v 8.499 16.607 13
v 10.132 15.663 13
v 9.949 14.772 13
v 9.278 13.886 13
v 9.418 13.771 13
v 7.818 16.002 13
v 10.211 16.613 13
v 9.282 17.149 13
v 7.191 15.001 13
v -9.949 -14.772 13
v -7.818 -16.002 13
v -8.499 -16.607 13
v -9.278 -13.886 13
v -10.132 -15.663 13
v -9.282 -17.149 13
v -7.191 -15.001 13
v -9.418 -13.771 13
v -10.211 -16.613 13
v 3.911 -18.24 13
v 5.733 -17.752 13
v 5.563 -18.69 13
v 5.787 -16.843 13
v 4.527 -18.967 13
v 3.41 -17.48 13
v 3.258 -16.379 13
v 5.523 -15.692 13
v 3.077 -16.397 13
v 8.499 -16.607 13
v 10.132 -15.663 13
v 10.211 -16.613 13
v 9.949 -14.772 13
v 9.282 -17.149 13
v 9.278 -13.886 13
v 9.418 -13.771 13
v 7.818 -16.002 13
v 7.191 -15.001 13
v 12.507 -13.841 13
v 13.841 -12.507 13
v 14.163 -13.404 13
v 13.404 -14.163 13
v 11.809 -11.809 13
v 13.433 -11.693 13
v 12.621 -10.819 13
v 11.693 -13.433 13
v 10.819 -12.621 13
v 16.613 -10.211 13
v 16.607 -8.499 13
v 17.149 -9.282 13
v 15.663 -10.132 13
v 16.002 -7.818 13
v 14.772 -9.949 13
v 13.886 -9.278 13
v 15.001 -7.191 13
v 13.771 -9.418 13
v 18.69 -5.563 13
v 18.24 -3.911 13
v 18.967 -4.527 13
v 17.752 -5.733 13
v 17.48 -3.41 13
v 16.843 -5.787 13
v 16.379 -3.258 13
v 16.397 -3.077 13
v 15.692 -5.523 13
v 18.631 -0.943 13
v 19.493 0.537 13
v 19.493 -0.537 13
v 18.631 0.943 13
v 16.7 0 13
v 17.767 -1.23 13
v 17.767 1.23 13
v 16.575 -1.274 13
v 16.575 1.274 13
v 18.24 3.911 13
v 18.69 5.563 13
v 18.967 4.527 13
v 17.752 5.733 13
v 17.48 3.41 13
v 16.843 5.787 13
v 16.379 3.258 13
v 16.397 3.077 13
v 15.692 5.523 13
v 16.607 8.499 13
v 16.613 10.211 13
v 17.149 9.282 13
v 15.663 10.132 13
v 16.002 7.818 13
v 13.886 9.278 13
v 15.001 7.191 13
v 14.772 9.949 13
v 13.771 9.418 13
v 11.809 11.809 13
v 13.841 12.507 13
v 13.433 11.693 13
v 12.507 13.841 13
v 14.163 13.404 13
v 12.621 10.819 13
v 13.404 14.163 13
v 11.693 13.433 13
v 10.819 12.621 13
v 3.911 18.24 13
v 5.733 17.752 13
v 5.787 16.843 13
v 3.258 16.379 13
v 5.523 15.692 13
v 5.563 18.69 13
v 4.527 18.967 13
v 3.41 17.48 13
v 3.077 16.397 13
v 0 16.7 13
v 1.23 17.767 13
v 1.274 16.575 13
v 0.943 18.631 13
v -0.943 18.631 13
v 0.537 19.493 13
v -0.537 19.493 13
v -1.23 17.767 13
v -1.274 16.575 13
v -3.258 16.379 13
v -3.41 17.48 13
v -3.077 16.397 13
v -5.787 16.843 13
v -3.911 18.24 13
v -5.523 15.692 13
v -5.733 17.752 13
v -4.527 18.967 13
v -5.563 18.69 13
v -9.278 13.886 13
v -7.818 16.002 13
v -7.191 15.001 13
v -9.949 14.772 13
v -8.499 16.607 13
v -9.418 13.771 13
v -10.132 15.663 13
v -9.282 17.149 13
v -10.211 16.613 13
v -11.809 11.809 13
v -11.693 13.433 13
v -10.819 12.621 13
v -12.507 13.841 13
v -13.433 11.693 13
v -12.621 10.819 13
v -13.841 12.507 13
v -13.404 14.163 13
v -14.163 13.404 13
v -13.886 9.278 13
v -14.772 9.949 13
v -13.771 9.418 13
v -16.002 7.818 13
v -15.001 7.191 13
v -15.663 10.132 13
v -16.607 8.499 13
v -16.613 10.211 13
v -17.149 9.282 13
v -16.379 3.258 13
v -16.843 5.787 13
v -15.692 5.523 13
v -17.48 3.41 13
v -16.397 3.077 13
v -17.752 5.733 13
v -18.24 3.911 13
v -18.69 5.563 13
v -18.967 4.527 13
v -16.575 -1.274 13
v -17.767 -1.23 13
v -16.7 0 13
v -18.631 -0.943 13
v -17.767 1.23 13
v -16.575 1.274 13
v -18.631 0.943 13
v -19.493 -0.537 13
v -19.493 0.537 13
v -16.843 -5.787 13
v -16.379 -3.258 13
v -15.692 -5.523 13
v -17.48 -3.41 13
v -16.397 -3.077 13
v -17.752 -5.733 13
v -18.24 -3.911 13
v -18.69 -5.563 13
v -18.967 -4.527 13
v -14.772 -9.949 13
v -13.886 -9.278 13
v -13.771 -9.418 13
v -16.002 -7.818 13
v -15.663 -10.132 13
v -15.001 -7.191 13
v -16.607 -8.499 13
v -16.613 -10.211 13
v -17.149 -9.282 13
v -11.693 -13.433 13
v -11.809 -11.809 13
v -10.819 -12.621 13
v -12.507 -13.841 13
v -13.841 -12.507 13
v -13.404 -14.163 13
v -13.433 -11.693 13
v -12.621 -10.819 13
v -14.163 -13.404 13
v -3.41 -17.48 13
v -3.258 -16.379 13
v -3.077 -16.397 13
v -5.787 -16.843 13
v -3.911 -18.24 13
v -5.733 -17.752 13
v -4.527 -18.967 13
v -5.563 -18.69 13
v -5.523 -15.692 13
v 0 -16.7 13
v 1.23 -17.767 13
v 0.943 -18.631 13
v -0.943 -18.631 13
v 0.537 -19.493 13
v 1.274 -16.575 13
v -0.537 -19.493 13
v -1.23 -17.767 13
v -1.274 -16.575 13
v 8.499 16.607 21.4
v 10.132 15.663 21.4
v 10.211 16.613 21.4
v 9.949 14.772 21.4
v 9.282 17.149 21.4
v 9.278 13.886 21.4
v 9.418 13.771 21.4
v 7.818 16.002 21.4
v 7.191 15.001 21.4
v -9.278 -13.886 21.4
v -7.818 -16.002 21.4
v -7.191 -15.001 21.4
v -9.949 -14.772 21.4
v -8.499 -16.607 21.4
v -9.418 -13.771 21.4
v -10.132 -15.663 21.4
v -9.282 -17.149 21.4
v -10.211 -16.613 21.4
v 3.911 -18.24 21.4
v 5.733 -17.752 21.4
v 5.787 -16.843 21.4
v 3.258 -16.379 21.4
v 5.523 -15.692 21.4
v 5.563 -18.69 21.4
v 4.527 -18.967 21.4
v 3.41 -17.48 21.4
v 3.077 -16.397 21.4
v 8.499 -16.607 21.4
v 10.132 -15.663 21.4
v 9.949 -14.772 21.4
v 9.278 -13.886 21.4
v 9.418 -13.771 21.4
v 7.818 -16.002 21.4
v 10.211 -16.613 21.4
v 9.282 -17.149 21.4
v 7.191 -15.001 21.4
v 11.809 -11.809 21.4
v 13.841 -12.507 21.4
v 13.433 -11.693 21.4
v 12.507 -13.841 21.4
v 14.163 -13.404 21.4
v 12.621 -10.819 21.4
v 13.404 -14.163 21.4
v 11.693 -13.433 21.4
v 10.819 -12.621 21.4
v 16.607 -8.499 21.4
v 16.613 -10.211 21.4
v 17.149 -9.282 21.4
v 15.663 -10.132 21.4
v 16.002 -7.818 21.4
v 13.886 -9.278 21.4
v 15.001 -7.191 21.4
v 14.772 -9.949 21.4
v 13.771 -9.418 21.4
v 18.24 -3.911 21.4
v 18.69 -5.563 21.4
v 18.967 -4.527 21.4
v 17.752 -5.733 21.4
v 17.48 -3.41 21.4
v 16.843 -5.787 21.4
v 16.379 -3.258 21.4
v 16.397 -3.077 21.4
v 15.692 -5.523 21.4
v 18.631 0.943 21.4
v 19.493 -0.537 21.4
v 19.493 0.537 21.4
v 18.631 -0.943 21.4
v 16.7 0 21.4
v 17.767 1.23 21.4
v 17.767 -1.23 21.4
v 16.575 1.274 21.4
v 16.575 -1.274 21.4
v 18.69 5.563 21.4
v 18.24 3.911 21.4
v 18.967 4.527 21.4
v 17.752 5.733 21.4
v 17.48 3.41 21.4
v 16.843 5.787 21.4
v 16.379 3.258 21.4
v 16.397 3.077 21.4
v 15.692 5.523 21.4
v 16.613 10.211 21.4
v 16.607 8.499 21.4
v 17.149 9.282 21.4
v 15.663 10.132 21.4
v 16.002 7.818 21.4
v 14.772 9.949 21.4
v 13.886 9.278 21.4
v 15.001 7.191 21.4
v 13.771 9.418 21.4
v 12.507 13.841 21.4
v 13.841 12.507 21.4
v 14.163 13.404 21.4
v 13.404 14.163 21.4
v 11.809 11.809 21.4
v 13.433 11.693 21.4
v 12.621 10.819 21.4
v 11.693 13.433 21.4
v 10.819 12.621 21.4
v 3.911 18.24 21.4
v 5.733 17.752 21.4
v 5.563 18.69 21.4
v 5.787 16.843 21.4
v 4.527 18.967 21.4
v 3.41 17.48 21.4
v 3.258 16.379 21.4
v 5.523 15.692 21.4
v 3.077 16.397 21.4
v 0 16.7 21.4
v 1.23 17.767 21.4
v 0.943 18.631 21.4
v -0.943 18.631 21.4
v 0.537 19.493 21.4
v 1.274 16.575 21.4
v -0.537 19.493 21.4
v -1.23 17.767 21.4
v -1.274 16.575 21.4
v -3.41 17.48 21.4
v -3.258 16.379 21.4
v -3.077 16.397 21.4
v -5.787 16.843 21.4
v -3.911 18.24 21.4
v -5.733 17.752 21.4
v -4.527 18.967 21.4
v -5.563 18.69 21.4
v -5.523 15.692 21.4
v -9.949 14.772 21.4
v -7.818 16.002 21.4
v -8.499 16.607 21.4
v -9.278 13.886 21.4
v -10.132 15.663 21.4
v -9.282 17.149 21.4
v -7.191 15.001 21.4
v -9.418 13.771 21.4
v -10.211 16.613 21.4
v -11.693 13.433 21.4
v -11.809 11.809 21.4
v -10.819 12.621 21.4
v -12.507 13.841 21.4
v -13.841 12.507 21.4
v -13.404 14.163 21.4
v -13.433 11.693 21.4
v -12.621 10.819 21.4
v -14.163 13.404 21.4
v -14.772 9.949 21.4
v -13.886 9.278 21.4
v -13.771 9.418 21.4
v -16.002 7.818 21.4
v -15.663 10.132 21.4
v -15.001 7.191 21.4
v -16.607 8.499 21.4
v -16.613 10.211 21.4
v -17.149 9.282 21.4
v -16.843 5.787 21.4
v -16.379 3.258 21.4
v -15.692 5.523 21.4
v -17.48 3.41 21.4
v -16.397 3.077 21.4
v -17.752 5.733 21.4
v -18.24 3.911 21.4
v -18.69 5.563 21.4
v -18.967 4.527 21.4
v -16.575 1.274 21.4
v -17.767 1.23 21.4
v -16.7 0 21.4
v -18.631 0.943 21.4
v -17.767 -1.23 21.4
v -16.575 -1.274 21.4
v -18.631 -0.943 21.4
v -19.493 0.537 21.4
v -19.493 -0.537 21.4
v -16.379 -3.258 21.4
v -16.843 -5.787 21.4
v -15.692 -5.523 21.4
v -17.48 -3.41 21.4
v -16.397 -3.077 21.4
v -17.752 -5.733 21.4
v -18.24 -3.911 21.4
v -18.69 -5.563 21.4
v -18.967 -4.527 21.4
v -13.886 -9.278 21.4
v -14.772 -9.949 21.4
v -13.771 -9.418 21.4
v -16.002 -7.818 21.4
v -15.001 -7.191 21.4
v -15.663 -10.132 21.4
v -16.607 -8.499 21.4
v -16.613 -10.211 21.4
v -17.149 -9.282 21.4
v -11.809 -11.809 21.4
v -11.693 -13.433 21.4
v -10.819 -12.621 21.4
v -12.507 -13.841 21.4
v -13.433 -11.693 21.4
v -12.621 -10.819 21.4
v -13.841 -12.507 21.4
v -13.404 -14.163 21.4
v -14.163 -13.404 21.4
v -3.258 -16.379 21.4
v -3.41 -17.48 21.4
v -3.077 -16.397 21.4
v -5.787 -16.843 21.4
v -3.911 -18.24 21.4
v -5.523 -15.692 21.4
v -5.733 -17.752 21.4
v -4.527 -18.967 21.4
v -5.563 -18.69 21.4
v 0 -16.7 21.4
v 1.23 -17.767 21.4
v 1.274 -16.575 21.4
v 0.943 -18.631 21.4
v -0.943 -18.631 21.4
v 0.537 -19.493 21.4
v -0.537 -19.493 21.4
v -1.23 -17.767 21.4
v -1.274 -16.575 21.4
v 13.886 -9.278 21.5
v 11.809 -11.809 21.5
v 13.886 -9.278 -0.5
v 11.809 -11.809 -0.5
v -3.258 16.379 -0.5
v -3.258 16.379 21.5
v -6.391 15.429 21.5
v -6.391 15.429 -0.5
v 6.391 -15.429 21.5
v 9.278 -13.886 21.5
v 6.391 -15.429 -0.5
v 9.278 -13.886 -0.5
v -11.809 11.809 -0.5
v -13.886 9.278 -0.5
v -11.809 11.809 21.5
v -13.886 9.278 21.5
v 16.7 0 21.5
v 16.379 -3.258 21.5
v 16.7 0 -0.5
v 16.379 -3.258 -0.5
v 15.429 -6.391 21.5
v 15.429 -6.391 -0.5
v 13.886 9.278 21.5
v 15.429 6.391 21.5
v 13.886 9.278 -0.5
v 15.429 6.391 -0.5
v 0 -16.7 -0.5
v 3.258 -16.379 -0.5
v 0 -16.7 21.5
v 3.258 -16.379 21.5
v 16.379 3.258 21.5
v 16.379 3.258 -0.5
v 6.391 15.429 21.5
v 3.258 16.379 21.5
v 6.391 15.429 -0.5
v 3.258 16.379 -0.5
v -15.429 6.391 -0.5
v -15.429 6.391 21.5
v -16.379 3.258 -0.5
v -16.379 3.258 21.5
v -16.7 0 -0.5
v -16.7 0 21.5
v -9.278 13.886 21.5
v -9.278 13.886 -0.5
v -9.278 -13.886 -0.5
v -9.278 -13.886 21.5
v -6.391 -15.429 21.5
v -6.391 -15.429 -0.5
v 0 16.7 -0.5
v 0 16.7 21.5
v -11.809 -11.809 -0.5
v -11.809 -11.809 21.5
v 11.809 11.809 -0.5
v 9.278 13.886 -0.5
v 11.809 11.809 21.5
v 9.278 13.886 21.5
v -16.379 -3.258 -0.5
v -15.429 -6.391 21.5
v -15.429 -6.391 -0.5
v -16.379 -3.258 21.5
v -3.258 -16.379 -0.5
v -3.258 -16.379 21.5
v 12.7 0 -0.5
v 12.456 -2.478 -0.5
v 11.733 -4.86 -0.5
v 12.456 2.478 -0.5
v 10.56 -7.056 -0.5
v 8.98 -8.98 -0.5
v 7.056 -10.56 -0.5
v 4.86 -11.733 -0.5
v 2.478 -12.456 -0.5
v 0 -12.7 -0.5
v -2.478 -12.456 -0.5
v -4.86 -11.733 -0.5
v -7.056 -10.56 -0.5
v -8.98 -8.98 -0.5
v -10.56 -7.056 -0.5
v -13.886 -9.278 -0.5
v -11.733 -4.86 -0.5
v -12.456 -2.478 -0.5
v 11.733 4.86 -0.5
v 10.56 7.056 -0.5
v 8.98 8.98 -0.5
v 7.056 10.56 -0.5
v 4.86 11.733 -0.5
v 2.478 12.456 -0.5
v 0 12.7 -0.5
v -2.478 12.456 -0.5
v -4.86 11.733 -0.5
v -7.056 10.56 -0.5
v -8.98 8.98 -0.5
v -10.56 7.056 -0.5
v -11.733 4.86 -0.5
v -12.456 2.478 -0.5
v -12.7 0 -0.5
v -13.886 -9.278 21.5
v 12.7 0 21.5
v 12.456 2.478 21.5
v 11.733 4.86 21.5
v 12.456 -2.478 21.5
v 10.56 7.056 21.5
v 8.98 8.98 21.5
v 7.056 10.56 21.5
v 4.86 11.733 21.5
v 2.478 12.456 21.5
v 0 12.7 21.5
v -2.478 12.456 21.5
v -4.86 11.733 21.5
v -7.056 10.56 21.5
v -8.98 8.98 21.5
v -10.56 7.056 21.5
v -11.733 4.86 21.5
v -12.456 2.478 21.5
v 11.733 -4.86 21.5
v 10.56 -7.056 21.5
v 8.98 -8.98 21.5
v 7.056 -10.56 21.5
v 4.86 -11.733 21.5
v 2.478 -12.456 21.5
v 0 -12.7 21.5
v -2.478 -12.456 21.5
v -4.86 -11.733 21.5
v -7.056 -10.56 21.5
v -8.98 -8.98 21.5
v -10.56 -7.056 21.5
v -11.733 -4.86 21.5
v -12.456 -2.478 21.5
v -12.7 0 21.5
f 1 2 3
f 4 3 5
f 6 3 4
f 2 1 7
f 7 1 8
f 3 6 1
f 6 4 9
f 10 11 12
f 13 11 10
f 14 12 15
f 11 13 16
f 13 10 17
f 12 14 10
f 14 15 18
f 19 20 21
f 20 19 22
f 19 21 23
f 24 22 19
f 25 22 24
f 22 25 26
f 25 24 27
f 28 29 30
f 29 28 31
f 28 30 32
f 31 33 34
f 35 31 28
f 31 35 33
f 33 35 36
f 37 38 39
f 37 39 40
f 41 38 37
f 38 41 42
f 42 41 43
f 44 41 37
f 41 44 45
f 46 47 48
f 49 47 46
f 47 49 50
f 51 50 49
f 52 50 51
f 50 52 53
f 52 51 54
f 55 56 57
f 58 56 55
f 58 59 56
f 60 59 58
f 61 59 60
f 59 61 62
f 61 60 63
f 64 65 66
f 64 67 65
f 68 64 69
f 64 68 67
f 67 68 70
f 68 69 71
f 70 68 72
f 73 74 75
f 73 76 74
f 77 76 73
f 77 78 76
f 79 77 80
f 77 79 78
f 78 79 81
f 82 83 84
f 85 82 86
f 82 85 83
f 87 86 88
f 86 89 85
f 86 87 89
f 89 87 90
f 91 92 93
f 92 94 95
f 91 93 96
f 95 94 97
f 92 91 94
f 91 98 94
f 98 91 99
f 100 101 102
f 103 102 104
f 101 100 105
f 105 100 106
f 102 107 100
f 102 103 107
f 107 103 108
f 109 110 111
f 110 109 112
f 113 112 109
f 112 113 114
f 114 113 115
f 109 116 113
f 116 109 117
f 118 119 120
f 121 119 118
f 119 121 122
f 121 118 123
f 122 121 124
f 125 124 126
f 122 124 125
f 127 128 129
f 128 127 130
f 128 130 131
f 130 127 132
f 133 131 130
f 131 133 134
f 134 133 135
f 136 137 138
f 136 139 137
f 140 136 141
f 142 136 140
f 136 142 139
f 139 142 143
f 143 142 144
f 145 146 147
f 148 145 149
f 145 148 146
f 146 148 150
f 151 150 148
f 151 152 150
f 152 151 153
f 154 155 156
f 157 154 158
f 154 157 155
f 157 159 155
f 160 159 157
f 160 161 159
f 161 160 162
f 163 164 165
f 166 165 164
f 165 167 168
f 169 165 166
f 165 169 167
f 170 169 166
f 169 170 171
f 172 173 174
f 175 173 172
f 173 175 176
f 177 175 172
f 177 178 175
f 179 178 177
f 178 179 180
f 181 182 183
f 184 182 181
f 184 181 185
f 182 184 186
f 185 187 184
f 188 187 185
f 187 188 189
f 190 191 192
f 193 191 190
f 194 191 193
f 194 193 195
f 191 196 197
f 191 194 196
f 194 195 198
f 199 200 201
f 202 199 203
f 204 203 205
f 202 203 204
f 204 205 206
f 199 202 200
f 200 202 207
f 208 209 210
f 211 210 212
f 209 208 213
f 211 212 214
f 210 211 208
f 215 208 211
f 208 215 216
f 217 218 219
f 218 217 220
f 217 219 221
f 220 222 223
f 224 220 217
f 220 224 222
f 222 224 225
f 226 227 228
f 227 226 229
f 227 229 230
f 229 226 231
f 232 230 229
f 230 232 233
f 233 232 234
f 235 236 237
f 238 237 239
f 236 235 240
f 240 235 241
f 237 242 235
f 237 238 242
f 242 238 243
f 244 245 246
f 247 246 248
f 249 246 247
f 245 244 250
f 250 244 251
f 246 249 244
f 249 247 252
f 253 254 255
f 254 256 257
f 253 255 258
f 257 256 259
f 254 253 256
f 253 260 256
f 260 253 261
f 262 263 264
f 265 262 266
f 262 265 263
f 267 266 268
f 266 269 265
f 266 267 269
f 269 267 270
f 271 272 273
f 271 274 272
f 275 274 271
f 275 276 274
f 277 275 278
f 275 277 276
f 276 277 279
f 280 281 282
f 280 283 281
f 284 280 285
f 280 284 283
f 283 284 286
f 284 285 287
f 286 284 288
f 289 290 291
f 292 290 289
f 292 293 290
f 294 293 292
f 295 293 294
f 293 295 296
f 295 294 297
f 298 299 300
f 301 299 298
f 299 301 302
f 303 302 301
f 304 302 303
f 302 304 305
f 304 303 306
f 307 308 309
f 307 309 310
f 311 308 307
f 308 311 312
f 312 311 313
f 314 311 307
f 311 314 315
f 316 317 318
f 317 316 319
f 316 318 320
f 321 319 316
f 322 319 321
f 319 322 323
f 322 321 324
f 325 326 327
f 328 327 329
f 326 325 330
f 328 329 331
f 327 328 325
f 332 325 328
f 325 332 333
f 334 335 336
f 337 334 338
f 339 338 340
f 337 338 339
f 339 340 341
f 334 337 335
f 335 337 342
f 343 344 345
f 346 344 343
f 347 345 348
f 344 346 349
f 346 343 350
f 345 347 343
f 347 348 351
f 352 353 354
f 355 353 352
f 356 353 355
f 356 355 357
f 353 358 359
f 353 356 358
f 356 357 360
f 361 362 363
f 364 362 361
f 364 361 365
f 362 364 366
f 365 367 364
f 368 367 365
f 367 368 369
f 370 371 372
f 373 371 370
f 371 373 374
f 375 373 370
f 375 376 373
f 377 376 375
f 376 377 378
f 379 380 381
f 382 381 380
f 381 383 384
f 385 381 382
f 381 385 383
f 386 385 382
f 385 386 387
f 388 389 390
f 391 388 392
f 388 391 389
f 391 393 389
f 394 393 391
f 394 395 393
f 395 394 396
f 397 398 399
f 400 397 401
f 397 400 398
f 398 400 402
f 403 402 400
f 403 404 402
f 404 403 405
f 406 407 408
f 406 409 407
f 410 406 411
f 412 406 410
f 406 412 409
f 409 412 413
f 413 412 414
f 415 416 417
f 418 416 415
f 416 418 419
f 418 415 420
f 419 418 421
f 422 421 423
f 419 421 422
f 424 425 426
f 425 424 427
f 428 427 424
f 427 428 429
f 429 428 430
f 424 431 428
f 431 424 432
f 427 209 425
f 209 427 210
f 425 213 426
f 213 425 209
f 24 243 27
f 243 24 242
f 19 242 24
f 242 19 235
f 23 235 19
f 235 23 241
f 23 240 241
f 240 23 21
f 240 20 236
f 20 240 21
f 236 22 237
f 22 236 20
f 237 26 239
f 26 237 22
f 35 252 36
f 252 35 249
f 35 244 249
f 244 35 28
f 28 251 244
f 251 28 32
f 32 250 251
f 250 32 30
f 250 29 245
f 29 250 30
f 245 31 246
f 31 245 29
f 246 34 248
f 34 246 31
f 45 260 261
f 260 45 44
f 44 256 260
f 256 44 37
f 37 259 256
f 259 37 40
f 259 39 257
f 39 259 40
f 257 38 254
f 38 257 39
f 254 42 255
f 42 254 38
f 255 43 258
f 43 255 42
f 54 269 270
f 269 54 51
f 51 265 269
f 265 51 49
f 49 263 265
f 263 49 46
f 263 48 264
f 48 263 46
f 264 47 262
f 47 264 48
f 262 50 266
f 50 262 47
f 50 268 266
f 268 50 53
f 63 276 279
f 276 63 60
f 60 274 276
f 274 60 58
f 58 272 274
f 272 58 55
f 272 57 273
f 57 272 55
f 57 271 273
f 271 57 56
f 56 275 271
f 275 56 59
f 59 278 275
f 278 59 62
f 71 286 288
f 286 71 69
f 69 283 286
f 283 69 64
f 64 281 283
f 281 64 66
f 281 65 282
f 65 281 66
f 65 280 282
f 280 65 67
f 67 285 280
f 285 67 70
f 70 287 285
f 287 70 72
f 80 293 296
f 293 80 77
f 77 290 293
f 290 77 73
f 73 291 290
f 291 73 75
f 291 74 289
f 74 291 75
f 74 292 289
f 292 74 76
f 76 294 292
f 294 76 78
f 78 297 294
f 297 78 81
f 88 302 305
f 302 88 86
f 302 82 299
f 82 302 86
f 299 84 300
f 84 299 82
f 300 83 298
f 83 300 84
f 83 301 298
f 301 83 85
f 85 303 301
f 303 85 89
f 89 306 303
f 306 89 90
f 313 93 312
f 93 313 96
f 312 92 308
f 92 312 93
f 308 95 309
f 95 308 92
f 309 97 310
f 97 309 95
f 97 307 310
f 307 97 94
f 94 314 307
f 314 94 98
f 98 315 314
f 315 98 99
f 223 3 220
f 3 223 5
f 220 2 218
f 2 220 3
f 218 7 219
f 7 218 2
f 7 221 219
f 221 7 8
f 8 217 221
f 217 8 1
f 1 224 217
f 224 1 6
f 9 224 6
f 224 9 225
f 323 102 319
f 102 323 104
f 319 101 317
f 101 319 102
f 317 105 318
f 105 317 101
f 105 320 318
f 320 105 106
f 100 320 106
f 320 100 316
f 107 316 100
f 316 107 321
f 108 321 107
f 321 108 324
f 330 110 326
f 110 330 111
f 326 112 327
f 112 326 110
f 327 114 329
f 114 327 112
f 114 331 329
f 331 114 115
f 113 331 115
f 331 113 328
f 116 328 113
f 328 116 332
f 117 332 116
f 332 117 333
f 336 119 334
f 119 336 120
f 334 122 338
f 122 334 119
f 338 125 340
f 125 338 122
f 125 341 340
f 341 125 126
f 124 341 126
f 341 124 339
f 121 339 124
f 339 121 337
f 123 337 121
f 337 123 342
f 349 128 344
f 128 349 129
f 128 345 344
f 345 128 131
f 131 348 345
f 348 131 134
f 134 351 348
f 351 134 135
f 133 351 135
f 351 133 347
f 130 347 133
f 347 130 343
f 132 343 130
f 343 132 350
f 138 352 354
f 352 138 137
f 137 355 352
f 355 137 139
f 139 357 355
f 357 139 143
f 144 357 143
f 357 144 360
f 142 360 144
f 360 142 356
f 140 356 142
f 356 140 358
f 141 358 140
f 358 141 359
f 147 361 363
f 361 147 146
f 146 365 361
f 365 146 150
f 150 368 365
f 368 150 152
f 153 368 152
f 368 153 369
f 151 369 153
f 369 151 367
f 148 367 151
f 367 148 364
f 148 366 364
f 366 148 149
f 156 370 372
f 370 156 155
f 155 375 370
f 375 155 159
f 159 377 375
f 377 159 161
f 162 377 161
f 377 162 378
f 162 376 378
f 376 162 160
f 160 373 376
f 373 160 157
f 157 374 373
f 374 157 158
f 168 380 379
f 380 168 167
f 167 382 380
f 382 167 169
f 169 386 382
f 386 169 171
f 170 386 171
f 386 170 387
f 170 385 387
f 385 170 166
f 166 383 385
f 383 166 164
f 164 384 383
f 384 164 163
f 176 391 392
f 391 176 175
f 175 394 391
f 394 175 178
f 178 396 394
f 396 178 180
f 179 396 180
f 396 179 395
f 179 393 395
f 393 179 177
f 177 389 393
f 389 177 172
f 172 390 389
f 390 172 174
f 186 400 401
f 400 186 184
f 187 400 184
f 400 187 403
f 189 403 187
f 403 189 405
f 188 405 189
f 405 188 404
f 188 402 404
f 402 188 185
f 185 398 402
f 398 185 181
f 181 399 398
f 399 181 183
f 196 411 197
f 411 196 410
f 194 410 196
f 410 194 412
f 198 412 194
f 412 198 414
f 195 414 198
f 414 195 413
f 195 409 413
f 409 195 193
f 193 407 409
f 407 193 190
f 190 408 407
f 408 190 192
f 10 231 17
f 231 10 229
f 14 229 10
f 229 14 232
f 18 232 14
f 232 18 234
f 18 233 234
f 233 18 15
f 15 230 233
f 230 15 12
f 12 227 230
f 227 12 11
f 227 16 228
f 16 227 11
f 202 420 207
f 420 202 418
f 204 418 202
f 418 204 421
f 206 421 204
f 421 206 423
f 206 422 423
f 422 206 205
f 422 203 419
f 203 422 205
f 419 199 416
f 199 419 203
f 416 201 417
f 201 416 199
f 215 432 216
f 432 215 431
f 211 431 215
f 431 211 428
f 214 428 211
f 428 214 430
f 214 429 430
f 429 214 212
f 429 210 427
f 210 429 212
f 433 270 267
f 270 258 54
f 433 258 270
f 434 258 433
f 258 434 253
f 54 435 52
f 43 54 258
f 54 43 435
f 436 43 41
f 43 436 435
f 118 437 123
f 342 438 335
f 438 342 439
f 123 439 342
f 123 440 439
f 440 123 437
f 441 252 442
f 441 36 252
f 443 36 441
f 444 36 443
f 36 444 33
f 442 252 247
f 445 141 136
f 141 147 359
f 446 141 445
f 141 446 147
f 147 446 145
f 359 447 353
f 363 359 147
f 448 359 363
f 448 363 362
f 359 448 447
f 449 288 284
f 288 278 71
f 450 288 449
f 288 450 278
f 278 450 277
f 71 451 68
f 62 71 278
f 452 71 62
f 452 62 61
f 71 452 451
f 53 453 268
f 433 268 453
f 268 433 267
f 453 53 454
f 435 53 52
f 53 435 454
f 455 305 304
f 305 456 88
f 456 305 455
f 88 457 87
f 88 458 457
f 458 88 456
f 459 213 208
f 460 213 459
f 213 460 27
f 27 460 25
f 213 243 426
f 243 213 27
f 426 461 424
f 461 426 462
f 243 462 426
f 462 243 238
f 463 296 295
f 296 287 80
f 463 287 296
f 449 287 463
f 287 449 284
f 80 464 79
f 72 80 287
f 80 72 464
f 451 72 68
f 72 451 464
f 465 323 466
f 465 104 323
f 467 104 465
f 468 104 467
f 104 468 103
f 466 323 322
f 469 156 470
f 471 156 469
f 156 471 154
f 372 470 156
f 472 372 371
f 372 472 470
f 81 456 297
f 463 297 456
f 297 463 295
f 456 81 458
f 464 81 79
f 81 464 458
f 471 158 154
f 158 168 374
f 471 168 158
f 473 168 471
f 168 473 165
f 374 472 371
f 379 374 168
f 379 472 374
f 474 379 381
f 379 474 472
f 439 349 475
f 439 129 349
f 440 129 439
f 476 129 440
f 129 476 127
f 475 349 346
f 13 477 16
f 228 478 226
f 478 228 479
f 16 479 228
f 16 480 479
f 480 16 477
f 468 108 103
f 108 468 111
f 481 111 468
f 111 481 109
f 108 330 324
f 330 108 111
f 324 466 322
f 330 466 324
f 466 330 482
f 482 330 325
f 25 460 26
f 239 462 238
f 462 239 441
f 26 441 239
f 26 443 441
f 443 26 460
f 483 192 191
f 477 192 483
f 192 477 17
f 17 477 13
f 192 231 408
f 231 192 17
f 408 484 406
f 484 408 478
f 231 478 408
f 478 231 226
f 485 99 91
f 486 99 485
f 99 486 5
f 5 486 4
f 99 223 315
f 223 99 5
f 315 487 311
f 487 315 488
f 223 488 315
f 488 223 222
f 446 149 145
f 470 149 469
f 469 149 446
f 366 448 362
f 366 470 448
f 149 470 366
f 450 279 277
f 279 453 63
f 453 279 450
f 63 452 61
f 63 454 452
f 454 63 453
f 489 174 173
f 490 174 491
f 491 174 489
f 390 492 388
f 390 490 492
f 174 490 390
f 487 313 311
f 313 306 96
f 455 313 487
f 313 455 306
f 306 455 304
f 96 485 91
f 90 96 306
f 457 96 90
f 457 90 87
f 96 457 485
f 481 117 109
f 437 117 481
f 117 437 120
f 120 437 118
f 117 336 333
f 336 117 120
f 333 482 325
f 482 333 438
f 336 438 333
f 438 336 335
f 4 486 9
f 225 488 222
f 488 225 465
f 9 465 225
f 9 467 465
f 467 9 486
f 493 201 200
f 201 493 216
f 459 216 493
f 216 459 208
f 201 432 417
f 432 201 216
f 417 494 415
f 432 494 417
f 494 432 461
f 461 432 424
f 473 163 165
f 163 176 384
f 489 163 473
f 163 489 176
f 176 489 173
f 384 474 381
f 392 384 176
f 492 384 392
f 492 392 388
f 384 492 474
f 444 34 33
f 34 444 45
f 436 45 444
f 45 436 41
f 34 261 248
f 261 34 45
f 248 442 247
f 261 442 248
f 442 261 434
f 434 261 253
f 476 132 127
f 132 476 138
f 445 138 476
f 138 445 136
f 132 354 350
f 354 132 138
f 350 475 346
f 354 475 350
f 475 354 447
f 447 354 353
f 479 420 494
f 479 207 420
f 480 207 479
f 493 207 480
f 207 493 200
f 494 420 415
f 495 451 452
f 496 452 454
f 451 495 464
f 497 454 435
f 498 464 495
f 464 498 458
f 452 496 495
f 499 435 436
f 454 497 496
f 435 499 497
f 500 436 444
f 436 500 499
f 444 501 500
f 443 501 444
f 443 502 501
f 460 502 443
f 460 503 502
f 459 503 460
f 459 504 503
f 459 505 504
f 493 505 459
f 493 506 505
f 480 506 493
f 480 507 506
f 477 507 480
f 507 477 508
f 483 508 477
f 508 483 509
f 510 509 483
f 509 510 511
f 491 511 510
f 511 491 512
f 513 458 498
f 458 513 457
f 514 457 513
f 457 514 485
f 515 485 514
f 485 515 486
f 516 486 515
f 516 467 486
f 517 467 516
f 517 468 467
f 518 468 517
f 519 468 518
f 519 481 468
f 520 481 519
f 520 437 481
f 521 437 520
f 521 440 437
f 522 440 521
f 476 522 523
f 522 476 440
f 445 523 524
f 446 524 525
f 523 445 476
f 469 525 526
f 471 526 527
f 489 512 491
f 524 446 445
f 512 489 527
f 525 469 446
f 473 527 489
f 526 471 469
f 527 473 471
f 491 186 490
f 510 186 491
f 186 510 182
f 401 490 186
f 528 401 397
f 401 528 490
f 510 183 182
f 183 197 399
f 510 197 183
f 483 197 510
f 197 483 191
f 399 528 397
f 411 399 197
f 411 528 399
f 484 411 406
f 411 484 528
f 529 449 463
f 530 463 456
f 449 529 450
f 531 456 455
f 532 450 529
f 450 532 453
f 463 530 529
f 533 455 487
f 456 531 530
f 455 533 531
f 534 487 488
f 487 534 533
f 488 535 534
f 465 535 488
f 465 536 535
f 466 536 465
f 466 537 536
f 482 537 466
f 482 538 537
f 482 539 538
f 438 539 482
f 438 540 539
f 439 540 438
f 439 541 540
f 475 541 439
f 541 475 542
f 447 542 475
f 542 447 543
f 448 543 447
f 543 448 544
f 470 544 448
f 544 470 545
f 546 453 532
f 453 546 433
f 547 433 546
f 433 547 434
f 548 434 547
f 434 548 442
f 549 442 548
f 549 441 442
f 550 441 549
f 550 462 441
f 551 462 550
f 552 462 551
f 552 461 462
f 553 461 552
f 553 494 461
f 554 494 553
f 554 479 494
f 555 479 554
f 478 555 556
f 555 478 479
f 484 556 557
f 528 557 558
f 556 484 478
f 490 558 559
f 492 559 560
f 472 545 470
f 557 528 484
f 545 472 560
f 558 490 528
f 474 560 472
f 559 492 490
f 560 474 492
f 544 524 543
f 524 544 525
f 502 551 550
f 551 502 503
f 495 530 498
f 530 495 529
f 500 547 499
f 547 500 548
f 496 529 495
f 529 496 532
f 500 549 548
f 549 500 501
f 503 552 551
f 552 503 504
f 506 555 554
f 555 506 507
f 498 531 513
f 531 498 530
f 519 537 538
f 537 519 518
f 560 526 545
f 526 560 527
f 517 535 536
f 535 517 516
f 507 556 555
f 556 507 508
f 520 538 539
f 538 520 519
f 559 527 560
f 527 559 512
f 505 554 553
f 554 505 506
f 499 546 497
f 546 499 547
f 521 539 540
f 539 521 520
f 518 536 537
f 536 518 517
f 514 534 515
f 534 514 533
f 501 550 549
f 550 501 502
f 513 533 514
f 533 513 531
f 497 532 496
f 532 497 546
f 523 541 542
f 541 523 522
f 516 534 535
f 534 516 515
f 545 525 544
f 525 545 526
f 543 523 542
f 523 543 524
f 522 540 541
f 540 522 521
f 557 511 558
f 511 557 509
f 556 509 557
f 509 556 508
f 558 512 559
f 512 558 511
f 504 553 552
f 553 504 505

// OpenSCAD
$fn = 32;

// ----------------------------------------------------------------------
// Two-module gear rim: z12 m2 and z24 m1.5, 21 mm wide
// ----------------------------------------------------------------------

// --- parameters (mm) ---
module_a = 2;             // first tooth module
teeth_a = 12;             // first band tooth count
module_b = 1.5;           // second tooth module
teeth_b = 24;             // second band tooth count
band_h = 8;               // height of one tooth band
web_t = 5;                // web thickness between the bands
total = 21;               // overall width over both bands
root_r = 9.5;             // root radius of the coarse band
hub_r = 16.7;             // hub radius
bore_d = 25.4;            // hub bore
hole_count = 4;           // lightening holes
hole_r = 7.75;            // lightening hole circle radius
hole_d = 4;               // lightening hole diameter

band_a = [[9.4, -1.378], [12.124, -1.51], [13.058, -1.154], [13.986, -0.621], [13.986, 0.621], [13.058, 1.154], [12.124, 1.51], [9.4, 1.378], [8.829, 3.507], [11.254, 4.755], [11.885, 5.53], [12.423, 6.456], [11.802, 7.531], [10.732, 7.528], [9.745, 7.369], [7.451, 5.893], [5.893, 7.451], [7.369, 9.745], [7.528, 10.732], [7.531, 11.802], [6.456, 12.423], [5.53, 11.885], [4.755, 11.254], [3.507, 8.829], [1.378, 9.4], [1.51, 12.124], [1.154, 13.058], [0.621, 13.986], [-0.621, 13.986], [-1.154, 13.058], [-1.51, 12.124], [-1.378, 9.4], [-3.507, 8.829], [-4.755, 11.254], [-5.53, 11.885], [-6.456, 12.423], [-7.531, 11.802], [-7.528, 10.732], [-7.369, 9.745], [-5.893, 7.451], [-7.451, 5.893], [-9.745, 7.369], [-10.732, 7.528], [-11.802, 7.531], [-12.423, 6.456], [-11.885, 5.53], [-11.254, 4.755], [-8.829, 3.507], [-9.4, 1.378], [-12.124, 1.51], [-13.058, 1.154], [-13.986, 0.621], [-13.986, -0.621], [-13.058, -1.154], [-12.124, -1.51], [-9.4, -1.378], [-8.829, -3.507], [-11.254, -4.755], [-11.885, -5.53], [-12.423, -6.456], [-11.802, -7.531], [-10.732, -7.528], [-9.745, -7.369], [-7.451, -5.893], [-5.893, -7.451], [-7.369, -9.745], [-7.528, -10.732], [-7.531, -11.802], [-6.456, -12.423], [-5.53, -11.885], [-4.755, -11.254], [-3.507, -8.829], [-1.378, -9.4], [-1.51, -12.124], [-1.154, -13.058], [-0.621, -13.986], [0.621, -13.986], [1.154, -13.058], [1.51, -12.124], [1.378, -9.4], [3.507, -8.829], [4.755, -11.254], [5.53, -11.885], [6.456, -12.423], [7.531, -11.802], [7.528, -10.732], [7.369, -9.745], [5.893, -7.451], [7.451, -5.893], [9.745, -7.369], [10.732, -7.528], [11.802, -7.531], [12.423, -6.456], [11.885, -5.53], [11.254, -4.755], [8.829, -3.507]];
band_b = [[16.073, -1.292], [17.767, -1.23], [18.631, -0.943], [19.493, -0.537], [19.493, 0.537], [18.631, 0.943], [17.767, 1.23], [16.073, 1.292], [15.86, 2.912], [17.48, 3.41], [18.24, 3.911], [18.967, 4.527], [18.69, 5.563], [17.752, 5.733], [16.843, 5.787], [15.191, 5.408], [14.566, 6.918], [16.002, 7.818], [16.607, 8.499], [17.149, 9.282], [16.613, 10.211], [15.663, 10.132], [14.772, 9.949], [13.274, 9.155], [12.279, 10.452], [13.433, 11.693], [13.841, 12.507], [14.163, 13.404], [13.404, 14.163], [12.507, 13.841], [11.693, 13.433], [10.452, 12.279], [9.155, 13.274], [9.949, 14.772], [10.132, 15.663], [10.211, 16.613], [9.282, 17.149], [8.499, 16.607], [7.818, 16.002], [6.918, 14.566], [5.408, 15.191], [5.787, 16.843], [5.733, 17.752], [5.563, 18.69], [4.527, 18.967], [3.911, 18.24], [3.41, 17.48], [2.912, 15.86], [1.292, 16.073], [1.23, 17.767], [0.943, 18.631], [0.537, 19.493], [-0.537, 19.493], [-0.943, 18.631], [-1.23, 17.767], [-1.292, 16.073], [-2.912, 15.86], [-3.41, 17.48], [-3.911, 18.24], [-4.527, 18.967], [-5.563, 18.69], [-5.733, 17.752], [-5.787, 16.843], [-5.408, 15.191], [-6.918, 14.566], [-7.818, 16.002], [-8.499, 16.607], [-9.282, 17.149], [-10.211, 16.613], [-10.132, 15.663], [-9.949, 14.772], [-9.155, 13.274], [-10.452, 12.279], [-11.693, 13.433], [-12.507, 13.841], [-13.404, 14.163], [-14.163, 13.404], [-13.841, 12.507], [-13.433, 11.693], [-12.279, 10.452], [-13.274, 9.155], [-14.772, 9.949], [-15.663, 10.132], [-16.613, 10.211], [-17.149, 9.282], [-16.607, 8.499], [-16.002, 7.818], [-14.566, 6.918], [-15.191, 5.408], [-16.843, 5.787], [-17.752, 5.733], [-18.69, 5.563], [-18.967, 4.527], [-18.24, 3.911], [-17.48, 3.41], [-15.86, 2.912], [-16.073, 1.292], [-17.767, 1.23], [-18.631, 0.943], [-19.493, 0.537], [-19.493, -0.537], [-18.631, -0.943], [-17.767, -1.23], [-16.073, -1.292], [-15.86, -2.912], [-17.48, -3.41], [-18.24, -3.911], [-18.967, -4.527], [-18.69, -5.563], [-17.752, -5.733], [-16.843, -5.787], [-15.191, -5.408], [-14.566, -6.918], [-16.002, -7.818], [-16.607, -8.499], [-17.149, -9.282], [-16.613, -10.211], [-15.663, -10.132], [-14.772, -9.949], [-13.274, -9.155], [-12.279, -10.452], [-13.433, -11.693], [-13.841, -12.507], [-14.163, -13.404], [-13.404, -14.163], [-12.507, -13.841], [-11.693, -13.433], [-10.452, -12.279], [-9.155, -13.274], [-9.949, -14.772], [-10.132, -15.663], [-10.211, -16.613], [-9.282, -17.149], [-8.499, -16.607], [-7.818, -16.002], [-6.918, -14.566], [-5.408, -15.191], [-5.787, -16.843], [-5.733, -17.752], [-5.563, -18.69], [-4.527, -18.967], [-3.911, -18.24], [-3.41, -17.48], [-2.912, -15.86], [-1.292, -16.073], [-1.23, -17.767], [-0.943, -18.631], [-0.537, -19.493], [0.537, -19.493], [0.943, -18.631], [1.23, -17.767], [1.292, -16.073], [2.912, -15.86], [3.41, -17.48], [3.911, -18.24], [4.527, -18.967], [5.563, -18.69], [5.733, -17.752], [5.787, -16.843], [5.408, -15.191], [6.918, -14.566], [7.818, -16.002], [8.499, -16.607], [9.282, -17.149], [10.211, -16.613], [10.132, -15.663], [9.949, -14.772], [9.155, -13.274], [10.452, -12.279], [11.693, -13.433], [12.507, -13.841], [13.404, -14.163], [14.163, -13.404], [13.841, -12.507], [13.433, -11.693], [12.279, -10.452], [13.274, -9.155], [14.772, -9.949], [15.663, -10.132], [16.613, -10.211], [17.149, -9.282], [16.607, -8.499], [16.002, -7.818], [14.566, -6.918], [15.191, -5.408], [16.843, -5.787], [17.752, -5.733], [18.69, -5.563], [18.967, -4.527], [18.24, -3.911], [17.48, -3.41], [15.86, -2.912]];

difference() {
  union() {
    /* tooth band A, overlapping the web by 0.4 mm */
    linear_extrude(height = band_h + 0.4) polygon(band_a);
    /* web */
    translate([0, 0, band_h - 0.4]) cylinder(h = web_t + 0.8, d = 2 * root_r);
    /* tooth band B */
    translate([0, 0, band_h + web_t]) linear_extrude(height = band_h + 0.4) polygon(band_b);
    /* hub */
    translate([0, 0, -0.5]) cylinder(h = total + 1.0, d = 2 * hub_r);
  }
  /* bore */
  translate([0, 0, -2.5]) cylinder(h = total + 5, d = bore_d);
  /* lightening holes through the web */
  for (i = [0 : hole_count - 1]) {
    a = i * 360 / hole_count;
    translate([hole_r * cos(a), hole_r * sin(a), -2.5]) cylinder(h = total + 5, d = hole_d);
  }
}
